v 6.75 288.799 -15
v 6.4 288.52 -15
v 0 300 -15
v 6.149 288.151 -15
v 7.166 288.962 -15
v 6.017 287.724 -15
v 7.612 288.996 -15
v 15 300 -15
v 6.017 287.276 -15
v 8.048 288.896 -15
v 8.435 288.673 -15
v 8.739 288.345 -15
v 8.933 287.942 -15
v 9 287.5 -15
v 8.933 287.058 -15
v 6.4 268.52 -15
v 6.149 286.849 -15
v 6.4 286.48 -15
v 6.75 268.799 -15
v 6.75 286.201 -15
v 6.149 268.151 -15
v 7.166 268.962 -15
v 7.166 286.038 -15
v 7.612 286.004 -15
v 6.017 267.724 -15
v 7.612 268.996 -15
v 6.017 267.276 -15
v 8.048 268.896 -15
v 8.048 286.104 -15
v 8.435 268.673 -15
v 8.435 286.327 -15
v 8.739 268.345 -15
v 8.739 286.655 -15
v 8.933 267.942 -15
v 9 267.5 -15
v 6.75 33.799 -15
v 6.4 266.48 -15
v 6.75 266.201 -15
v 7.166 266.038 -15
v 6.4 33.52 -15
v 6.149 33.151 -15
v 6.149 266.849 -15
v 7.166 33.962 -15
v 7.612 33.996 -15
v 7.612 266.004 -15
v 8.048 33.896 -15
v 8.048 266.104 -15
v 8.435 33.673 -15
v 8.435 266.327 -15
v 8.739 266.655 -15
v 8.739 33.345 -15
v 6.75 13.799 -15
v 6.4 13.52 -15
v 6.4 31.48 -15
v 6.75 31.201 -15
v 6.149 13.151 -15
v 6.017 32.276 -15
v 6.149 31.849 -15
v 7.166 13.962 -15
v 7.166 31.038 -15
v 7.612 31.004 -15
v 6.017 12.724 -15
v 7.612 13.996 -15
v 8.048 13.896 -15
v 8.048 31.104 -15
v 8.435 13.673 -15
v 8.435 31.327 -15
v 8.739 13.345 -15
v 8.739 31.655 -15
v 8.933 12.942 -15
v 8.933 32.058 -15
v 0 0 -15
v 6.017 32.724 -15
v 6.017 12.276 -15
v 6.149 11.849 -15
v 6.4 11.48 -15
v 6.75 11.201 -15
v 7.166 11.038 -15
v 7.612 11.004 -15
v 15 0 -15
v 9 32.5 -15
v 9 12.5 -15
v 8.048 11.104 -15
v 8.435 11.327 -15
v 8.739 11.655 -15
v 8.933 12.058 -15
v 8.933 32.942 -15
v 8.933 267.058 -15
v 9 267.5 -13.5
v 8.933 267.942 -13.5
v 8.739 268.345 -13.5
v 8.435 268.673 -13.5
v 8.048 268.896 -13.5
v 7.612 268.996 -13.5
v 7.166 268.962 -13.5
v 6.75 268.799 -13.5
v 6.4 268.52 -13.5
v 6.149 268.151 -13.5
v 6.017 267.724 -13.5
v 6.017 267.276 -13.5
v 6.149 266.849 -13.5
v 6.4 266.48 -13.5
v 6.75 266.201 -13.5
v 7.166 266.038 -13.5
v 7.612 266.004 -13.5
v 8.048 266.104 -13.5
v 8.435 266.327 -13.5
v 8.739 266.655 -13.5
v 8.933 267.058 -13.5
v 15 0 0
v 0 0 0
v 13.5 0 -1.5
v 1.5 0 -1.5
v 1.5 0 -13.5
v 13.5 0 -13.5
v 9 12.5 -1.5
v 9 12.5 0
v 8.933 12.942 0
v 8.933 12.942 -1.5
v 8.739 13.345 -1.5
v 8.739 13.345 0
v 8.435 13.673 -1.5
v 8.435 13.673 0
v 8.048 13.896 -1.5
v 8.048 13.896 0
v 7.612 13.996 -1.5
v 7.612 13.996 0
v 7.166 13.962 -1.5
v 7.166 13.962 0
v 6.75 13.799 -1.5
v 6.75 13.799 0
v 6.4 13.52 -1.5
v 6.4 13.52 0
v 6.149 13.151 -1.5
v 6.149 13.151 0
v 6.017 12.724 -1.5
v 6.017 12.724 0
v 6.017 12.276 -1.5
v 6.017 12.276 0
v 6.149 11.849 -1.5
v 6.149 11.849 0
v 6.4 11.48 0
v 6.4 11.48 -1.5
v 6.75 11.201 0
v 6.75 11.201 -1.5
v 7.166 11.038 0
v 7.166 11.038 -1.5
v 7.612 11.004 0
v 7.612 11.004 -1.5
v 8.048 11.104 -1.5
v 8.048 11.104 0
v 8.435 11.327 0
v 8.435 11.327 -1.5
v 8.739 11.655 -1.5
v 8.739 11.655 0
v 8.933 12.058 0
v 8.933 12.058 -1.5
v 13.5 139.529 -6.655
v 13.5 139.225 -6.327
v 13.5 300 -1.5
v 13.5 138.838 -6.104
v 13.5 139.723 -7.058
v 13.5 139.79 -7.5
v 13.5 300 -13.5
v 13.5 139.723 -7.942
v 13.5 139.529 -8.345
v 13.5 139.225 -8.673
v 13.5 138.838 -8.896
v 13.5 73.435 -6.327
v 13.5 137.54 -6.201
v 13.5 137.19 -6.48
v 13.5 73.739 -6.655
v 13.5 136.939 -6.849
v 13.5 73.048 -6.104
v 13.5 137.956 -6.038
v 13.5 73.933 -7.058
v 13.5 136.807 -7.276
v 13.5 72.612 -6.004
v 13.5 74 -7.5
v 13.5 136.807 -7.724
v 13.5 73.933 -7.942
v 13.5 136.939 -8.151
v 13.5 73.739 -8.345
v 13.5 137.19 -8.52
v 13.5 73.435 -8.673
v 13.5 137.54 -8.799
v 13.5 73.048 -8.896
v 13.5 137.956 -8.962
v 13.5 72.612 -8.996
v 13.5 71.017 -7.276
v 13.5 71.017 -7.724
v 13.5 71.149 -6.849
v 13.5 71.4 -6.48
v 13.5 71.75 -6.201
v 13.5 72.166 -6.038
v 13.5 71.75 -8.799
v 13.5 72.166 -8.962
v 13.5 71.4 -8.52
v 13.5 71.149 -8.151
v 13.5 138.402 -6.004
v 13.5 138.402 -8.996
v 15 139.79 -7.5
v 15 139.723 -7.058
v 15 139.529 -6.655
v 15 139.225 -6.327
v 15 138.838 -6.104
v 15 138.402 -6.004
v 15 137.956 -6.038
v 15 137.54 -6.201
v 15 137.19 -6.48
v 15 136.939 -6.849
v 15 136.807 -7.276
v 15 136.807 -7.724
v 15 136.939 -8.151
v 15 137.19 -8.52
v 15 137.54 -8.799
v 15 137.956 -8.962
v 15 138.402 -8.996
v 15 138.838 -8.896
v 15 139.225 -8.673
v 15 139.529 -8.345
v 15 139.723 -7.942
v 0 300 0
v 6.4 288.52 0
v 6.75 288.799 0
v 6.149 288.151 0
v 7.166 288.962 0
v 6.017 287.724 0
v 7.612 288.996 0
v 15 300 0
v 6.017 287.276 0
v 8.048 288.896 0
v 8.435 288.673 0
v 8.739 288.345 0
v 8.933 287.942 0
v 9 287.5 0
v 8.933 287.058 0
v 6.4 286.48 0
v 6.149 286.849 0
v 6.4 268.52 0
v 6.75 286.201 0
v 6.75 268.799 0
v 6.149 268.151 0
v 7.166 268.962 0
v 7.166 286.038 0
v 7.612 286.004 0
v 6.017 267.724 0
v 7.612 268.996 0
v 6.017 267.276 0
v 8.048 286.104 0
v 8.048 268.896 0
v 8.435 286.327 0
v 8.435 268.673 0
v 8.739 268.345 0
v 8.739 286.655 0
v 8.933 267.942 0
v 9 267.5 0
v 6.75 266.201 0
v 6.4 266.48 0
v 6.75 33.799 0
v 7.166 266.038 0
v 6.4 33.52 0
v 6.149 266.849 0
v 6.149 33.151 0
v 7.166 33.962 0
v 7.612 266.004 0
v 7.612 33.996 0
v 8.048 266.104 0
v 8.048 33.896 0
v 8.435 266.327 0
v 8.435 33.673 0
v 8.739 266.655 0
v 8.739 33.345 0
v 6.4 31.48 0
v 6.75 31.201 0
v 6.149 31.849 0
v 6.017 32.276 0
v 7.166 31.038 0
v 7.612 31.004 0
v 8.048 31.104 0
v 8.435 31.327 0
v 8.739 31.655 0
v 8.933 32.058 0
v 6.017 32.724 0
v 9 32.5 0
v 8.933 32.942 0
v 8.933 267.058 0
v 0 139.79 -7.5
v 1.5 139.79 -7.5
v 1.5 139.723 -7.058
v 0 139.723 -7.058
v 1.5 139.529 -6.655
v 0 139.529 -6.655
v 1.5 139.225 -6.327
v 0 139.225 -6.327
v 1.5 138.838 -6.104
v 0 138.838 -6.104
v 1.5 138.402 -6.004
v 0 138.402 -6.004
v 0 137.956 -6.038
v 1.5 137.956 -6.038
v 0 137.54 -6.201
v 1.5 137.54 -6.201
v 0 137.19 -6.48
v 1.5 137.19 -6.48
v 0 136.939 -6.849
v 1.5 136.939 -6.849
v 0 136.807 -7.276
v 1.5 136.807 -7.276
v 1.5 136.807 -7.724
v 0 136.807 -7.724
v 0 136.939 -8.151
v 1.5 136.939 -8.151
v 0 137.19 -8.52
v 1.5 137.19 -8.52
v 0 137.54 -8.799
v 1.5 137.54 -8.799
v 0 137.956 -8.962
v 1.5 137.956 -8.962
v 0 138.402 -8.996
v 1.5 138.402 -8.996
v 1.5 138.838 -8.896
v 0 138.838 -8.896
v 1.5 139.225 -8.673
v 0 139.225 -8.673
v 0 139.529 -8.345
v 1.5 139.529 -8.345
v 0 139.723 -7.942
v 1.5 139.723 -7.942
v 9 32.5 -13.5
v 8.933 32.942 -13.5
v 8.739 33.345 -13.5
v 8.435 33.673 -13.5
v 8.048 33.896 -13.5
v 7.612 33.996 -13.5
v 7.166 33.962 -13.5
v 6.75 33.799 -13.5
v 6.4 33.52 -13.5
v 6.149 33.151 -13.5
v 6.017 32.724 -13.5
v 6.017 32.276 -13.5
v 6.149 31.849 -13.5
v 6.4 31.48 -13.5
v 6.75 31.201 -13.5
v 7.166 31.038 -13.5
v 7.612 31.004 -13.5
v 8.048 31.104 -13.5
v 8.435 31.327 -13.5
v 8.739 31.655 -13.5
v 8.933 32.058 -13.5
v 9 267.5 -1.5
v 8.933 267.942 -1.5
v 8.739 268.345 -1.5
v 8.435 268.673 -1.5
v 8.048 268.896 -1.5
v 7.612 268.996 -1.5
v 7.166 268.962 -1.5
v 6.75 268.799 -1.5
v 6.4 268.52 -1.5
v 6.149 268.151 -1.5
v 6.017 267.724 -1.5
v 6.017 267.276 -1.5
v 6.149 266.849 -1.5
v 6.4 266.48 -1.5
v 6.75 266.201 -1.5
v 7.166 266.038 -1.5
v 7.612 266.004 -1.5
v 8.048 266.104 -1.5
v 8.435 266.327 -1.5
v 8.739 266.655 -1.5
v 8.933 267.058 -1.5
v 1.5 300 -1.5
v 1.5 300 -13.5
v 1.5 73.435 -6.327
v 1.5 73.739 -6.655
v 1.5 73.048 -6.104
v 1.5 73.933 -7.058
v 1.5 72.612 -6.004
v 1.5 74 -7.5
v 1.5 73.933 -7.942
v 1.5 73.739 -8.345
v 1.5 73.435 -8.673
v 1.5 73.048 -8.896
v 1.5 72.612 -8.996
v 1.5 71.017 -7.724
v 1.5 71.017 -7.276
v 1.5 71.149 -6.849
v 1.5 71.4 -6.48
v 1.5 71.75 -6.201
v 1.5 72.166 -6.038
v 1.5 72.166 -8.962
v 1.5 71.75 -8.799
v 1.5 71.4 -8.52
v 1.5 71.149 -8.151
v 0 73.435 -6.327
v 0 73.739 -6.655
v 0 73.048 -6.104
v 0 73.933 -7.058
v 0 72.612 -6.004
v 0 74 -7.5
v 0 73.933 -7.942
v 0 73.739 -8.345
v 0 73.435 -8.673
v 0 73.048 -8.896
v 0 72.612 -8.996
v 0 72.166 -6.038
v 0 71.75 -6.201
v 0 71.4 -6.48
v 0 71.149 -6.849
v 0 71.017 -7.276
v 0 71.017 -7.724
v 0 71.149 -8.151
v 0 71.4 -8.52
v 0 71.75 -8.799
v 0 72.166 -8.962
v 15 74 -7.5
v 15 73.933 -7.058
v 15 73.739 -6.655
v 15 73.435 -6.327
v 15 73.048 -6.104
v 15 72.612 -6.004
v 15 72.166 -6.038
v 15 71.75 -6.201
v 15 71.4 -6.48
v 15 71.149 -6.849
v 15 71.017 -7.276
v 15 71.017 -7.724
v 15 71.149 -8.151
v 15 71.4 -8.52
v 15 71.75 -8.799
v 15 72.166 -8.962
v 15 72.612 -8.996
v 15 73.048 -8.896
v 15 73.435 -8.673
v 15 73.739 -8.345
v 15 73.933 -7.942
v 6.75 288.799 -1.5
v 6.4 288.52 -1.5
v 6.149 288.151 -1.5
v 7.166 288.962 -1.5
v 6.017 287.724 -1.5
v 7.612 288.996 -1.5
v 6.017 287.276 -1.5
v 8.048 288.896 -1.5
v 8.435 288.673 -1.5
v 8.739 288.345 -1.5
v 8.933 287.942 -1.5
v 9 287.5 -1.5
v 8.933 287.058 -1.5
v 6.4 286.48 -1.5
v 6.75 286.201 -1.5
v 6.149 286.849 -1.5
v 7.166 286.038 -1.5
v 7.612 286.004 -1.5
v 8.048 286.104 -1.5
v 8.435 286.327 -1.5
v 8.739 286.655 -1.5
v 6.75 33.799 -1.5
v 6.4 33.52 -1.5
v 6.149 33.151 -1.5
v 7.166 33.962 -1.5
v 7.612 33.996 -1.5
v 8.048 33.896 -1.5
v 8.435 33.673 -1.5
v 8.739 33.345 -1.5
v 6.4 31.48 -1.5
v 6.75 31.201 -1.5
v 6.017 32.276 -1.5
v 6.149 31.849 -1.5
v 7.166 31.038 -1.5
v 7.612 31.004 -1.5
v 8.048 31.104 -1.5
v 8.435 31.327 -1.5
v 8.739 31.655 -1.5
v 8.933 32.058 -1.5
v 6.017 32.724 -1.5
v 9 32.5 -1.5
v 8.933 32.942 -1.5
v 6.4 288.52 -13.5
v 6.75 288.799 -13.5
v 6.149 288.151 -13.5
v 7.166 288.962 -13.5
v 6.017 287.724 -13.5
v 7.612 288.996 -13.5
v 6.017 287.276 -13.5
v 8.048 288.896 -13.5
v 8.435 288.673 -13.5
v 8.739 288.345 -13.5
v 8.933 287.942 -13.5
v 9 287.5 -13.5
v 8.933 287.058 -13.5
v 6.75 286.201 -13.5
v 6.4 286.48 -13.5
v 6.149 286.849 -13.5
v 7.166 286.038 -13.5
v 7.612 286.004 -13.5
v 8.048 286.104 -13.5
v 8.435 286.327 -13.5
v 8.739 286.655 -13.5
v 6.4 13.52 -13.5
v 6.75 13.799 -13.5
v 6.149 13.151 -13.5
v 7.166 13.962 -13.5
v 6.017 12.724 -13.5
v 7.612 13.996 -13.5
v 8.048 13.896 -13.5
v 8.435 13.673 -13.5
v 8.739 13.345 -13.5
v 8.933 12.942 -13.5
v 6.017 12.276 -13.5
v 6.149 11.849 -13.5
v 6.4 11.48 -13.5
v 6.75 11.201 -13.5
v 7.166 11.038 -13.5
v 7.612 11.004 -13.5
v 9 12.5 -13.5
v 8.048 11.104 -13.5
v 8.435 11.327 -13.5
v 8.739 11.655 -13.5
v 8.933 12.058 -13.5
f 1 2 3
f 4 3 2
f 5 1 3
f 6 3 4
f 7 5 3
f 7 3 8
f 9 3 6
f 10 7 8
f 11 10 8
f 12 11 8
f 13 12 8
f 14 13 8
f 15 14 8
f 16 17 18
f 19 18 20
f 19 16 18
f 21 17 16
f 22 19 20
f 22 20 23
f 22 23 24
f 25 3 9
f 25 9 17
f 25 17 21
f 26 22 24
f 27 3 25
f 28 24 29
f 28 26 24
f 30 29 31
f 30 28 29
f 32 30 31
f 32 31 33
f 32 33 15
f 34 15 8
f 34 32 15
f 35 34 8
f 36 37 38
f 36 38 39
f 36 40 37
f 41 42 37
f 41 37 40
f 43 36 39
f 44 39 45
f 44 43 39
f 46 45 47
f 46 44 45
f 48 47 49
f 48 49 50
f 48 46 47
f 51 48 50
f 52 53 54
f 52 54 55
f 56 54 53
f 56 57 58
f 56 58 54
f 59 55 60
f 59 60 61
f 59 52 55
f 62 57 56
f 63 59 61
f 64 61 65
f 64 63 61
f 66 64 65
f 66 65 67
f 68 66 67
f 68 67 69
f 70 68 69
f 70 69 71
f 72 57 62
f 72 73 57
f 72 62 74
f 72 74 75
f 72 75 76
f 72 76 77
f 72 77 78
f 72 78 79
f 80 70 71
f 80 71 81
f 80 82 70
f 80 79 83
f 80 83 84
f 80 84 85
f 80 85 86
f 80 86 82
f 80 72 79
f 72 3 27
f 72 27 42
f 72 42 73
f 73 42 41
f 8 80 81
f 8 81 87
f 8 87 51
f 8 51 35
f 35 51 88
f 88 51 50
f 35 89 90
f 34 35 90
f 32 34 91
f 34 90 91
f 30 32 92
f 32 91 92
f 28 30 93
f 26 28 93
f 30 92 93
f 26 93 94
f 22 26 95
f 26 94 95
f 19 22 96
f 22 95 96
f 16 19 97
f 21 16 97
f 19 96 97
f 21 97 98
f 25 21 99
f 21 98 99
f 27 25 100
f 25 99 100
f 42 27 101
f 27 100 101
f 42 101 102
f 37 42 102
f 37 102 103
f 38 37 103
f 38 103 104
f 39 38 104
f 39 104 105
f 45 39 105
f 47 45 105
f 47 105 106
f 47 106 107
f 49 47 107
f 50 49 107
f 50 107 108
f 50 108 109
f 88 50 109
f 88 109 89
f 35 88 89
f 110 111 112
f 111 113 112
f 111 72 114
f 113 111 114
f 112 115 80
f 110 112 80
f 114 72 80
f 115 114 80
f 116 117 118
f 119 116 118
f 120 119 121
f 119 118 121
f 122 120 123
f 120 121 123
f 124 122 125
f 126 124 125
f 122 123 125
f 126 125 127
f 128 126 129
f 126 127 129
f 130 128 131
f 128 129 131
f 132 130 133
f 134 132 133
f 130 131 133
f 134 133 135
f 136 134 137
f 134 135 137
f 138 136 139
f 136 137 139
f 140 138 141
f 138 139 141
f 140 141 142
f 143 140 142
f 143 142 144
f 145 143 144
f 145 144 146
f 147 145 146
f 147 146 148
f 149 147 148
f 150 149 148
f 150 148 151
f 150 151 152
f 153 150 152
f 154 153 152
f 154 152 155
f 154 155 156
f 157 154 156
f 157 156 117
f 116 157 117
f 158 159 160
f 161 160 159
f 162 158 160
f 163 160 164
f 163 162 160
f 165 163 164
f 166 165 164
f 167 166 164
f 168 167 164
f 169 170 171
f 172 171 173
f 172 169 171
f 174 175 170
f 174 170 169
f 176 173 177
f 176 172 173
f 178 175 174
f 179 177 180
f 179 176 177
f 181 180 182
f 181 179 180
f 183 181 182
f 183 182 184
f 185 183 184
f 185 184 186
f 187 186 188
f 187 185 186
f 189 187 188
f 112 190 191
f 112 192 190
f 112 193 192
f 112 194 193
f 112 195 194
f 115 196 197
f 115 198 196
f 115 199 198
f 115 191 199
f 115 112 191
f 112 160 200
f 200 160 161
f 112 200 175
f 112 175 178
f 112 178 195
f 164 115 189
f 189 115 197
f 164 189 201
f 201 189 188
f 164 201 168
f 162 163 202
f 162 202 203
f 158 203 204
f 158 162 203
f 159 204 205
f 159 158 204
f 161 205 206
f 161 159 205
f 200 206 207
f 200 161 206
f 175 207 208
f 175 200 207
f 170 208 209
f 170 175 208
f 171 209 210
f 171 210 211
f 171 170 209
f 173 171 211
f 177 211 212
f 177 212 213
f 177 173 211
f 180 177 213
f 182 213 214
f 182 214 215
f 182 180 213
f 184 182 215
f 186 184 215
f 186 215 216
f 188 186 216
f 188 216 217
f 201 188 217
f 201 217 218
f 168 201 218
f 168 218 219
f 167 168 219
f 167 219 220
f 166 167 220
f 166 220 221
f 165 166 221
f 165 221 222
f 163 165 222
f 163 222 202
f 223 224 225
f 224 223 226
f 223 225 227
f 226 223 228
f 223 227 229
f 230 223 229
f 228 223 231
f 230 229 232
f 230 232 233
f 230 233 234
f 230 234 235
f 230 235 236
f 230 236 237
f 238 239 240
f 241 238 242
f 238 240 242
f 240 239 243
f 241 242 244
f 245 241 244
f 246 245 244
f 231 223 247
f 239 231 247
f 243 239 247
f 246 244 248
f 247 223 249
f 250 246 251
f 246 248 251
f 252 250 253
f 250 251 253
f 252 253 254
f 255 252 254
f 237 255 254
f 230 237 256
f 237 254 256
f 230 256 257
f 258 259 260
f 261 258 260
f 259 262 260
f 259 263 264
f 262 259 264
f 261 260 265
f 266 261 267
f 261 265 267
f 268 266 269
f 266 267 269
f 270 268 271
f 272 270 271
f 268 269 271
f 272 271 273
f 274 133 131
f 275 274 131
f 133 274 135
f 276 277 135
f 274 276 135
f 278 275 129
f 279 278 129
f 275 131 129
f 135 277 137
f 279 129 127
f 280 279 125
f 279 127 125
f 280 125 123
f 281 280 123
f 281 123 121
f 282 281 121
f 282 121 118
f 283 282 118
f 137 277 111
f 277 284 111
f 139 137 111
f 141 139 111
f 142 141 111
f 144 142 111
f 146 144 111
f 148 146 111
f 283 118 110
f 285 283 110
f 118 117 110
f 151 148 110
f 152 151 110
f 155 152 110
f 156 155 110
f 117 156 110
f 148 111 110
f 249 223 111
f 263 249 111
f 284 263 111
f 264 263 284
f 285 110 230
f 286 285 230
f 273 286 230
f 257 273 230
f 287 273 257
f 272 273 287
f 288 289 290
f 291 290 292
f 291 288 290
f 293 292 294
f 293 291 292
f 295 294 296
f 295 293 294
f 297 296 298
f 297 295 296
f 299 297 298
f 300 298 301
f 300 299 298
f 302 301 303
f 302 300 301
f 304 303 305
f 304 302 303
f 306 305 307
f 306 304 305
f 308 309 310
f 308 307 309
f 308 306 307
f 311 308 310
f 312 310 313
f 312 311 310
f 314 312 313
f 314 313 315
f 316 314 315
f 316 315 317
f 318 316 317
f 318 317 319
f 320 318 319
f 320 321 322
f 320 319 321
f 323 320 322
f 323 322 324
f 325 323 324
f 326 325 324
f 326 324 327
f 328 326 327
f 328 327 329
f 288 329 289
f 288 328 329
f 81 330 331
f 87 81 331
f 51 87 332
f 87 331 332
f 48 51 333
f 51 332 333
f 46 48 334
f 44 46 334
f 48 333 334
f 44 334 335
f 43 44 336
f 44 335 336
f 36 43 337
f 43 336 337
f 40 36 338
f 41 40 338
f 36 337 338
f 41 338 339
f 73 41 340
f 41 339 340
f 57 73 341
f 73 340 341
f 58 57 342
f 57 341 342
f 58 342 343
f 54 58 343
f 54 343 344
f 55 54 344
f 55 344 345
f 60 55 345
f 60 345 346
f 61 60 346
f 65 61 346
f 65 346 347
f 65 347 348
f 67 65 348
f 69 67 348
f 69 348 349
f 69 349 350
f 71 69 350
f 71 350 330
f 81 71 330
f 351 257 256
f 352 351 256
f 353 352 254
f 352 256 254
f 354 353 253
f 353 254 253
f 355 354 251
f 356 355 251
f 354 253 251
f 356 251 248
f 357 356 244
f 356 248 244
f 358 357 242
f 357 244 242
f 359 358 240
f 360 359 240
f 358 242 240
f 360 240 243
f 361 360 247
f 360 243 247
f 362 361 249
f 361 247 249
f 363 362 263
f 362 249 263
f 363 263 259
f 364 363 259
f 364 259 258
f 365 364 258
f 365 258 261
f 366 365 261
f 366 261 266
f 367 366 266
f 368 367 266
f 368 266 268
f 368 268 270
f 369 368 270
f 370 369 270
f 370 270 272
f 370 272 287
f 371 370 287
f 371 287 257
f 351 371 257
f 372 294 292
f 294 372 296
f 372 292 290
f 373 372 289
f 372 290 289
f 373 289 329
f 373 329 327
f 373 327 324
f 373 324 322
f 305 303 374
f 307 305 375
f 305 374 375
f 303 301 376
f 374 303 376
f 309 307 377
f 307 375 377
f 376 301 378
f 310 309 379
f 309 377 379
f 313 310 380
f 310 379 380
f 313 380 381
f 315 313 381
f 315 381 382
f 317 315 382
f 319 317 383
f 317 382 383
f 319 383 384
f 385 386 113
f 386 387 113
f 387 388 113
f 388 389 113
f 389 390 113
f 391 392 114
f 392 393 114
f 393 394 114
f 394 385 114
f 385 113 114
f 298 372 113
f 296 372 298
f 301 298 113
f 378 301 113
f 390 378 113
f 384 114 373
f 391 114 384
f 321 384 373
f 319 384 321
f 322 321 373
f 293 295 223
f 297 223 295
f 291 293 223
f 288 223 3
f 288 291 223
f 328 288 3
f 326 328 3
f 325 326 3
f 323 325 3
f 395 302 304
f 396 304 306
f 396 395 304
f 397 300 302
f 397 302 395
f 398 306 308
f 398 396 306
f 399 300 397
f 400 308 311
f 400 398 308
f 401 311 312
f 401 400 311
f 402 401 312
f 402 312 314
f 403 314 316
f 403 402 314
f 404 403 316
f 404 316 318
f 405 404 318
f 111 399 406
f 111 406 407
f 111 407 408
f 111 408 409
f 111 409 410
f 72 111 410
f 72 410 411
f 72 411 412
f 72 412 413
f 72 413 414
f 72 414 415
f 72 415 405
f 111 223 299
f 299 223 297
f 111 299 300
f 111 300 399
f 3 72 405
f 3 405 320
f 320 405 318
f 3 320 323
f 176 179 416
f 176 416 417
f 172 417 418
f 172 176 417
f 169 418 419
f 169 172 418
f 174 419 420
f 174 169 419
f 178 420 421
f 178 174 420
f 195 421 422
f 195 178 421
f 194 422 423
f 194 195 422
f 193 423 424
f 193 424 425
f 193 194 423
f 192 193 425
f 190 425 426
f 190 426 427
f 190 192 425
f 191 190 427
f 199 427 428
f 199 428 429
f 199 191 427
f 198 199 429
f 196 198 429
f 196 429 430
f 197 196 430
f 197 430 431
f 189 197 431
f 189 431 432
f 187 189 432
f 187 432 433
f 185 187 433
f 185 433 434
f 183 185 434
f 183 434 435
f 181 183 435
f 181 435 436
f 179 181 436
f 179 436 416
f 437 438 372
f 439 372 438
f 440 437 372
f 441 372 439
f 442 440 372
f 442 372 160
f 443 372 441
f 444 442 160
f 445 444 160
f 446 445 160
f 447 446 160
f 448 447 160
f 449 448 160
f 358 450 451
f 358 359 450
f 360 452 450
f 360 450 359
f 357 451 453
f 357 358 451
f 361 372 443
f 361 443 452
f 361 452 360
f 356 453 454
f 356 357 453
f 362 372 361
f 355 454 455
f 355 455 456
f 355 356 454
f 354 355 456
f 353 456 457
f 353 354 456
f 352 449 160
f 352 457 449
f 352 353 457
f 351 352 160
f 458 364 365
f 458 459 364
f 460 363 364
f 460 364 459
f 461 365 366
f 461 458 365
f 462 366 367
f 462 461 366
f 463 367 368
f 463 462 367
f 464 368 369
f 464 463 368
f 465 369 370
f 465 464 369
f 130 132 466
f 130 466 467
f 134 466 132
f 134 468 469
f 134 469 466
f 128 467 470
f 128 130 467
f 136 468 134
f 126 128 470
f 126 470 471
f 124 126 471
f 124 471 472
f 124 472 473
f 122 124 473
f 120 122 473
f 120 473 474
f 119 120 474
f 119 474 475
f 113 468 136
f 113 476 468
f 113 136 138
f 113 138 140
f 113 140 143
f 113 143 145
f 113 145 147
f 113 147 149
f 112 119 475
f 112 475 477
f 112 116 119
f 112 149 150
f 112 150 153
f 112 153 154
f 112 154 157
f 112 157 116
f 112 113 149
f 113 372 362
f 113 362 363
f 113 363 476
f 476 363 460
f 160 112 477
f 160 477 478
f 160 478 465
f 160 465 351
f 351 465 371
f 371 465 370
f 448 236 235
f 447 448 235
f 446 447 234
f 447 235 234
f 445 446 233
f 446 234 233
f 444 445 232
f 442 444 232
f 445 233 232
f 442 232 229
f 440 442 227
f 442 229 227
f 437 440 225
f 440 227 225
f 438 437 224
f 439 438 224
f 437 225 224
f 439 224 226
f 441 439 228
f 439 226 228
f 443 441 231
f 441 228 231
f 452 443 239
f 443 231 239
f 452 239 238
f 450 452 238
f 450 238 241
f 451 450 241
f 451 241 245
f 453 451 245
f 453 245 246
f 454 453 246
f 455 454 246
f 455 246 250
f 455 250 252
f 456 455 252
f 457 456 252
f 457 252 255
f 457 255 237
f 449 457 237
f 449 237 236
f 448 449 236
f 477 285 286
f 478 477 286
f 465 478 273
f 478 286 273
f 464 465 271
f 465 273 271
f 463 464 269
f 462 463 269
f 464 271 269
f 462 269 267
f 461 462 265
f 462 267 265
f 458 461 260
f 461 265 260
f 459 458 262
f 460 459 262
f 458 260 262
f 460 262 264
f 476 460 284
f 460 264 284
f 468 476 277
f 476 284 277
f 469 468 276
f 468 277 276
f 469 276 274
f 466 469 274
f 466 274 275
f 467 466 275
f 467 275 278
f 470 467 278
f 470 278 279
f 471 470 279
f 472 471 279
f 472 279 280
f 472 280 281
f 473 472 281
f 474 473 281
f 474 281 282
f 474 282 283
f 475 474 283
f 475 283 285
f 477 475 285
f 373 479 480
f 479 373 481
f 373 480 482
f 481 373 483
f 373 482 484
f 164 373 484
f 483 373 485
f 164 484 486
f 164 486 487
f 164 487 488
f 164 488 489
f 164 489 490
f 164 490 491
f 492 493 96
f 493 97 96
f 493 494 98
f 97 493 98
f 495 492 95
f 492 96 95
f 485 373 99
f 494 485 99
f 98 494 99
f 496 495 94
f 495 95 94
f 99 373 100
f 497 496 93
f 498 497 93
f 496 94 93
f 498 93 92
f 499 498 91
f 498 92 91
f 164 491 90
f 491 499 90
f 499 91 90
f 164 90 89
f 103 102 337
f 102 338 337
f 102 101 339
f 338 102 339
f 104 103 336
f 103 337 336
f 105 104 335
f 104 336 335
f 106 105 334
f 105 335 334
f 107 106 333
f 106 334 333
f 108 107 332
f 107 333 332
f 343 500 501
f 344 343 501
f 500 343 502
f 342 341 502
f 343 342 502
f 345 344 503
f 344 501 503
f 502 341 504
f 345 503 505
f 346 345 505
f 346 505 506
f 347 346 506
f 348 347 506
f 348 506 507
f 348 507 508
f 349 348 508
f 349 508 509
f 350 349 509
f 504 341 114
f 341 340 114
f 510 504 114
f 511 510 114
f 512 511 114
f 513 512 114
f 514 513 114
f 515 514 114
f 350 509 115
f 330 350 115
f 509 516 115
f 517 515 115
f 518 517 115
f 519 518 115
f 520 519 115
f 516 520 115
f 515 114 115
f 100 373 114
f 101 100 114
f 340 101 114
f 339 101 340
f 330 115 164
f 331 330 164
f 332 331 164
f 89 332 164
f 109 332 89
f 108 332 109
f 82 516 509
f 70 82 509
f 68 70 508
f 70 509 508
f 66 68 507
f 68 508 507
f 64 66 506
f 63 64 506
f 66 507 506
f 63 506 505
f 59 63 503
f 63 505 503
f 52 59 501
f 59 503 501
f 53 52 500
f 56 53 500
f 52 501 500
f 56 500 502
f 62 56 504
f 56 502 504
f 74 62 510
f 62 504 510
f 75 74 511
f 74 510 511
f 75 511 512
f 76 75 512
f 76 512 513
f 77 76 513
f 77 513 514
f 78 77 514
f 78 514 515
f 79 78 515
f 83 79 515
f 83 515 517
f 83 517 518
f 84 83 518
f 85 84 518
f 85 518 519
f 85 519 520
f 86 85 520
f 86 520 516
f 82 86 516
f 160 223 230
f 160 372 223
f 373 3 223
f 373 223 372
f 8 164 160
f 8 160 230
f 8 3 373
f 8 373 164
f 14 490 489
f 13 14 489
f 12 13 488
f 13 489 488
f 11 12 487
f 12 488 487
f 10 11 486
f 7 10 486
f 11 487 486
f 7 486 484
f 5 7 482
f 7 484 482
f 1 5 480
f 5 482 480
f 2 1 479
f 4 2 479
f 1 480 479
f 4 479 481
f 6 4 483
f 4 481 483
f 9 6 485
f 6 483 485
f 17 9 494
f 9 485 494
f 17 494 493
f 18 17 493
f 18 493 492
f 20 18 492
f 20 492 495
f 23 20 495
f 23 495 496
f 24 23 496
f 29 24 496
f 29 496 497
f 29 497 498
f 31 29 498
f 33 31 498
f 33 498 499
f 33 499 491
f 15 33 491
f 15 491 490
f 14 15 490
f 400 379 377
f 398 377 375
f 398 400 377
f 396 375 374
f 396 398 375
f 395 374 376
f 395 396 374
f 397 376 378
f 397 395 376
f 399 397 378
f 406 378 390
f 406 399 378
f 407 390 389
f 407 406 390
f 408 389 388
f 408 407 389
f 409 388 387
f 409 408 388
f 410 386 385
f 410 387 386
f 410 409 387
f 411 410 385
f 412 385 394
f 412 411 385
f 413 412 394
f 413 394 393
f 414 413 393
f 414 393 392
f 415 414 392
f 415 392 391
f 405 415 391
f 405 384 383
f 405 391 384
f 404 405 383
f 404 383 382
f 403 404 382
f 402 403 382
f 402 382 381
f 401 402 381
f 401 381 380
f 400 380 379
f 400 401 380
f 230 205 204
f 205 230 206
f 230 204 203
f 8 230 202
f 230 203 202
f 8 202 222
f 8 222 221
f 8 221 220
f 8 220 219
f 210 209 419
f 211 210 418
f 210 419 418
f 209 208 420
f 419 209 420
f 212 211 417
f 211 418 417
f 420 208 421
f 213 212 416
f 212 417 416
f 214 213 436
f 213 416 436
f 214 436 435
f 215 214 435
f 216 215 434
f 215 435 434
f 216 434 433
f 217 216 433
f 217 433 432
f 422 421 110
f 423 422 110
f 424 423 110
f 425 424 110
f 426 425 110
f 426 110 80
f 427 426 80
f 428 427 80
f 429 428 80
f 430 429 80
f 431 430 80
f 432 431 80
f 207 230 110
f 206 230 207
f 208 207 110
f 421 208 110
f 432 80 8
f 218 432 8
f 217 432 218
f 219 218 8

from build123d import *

# Parameters (mm, degrees)
SKETCH1_W              = 15
SKETCH1_H              = 15
SKETCH1_W_2            = 12
SKETCH1_H_2            = 12
EXTRUDE_THIN1_DEPTH    = 300
SKETCH2_R              = 1.5
CUT_EXTRUDE1_DEPTH     = 301.749064836
CUT_EXTRUDE2_OUTLINE_R = 1.5
CUT_EXTRUDE2_DEPTH     = 15


# Read off the part's stored shape, not the designer's step: Cut-Extrude2
with BuildPart() as part:
    # Sketch1 → Extrude-Thin1 (new body)
    with BuildSketch(Plane(origin=(0, 0, 0), x_dir=(1, 0, 0), z_dir=(0, 1, 0))):
        with Locations((7.5, 7.5)):
            Rectangle(SKETCH1_W, SKETCH1_H)
        with Locations((7.5, 7.5)):
            Rectangle(SKETCH1_W_2, SKETCH1_H_2, mode=Mode.SUBTRACT)
    extrude(amount=EXTRUDE_THIN1_DEPTH)

    # Sketch2 (on Front Plane) → Cut-Extrude1 (cut, through all)
    with BuildSketch(Plane.XY):
        with Locations((7.5, 12.5)):
            Circle(SKETCH2_R)
        with Locations((7.5, 32.5)):
            Circle(SKETCH2_R)
        with Locations((7.5, 267.5)):
            Circle(SKETCH2_R)
        with Locations((7.5, 287.5)):
            Circle(SKETCH2_R)
    extrude(amount=-CUT_EXTRUDE1_DEPTH, mode=Mode.SUBTRACT)

    # Cut-Extrude2 outline → Cut-Extrude2 (cut)
    with BuildSketch(Plane.YZ):
        with Locations((138.290000004, -7.5)):
            Circle(CUT_EXTRUDE2_OUTLINE_R)
        with Locations((72.500000004, -7.5)):
            Circle(CUT_EXTRUDE2_OUTLINE_R)
    extrude(amount=CUT_EXTRUDE2_DEPTH, mode=Mode.SUBTRACT)


solid = part.part
